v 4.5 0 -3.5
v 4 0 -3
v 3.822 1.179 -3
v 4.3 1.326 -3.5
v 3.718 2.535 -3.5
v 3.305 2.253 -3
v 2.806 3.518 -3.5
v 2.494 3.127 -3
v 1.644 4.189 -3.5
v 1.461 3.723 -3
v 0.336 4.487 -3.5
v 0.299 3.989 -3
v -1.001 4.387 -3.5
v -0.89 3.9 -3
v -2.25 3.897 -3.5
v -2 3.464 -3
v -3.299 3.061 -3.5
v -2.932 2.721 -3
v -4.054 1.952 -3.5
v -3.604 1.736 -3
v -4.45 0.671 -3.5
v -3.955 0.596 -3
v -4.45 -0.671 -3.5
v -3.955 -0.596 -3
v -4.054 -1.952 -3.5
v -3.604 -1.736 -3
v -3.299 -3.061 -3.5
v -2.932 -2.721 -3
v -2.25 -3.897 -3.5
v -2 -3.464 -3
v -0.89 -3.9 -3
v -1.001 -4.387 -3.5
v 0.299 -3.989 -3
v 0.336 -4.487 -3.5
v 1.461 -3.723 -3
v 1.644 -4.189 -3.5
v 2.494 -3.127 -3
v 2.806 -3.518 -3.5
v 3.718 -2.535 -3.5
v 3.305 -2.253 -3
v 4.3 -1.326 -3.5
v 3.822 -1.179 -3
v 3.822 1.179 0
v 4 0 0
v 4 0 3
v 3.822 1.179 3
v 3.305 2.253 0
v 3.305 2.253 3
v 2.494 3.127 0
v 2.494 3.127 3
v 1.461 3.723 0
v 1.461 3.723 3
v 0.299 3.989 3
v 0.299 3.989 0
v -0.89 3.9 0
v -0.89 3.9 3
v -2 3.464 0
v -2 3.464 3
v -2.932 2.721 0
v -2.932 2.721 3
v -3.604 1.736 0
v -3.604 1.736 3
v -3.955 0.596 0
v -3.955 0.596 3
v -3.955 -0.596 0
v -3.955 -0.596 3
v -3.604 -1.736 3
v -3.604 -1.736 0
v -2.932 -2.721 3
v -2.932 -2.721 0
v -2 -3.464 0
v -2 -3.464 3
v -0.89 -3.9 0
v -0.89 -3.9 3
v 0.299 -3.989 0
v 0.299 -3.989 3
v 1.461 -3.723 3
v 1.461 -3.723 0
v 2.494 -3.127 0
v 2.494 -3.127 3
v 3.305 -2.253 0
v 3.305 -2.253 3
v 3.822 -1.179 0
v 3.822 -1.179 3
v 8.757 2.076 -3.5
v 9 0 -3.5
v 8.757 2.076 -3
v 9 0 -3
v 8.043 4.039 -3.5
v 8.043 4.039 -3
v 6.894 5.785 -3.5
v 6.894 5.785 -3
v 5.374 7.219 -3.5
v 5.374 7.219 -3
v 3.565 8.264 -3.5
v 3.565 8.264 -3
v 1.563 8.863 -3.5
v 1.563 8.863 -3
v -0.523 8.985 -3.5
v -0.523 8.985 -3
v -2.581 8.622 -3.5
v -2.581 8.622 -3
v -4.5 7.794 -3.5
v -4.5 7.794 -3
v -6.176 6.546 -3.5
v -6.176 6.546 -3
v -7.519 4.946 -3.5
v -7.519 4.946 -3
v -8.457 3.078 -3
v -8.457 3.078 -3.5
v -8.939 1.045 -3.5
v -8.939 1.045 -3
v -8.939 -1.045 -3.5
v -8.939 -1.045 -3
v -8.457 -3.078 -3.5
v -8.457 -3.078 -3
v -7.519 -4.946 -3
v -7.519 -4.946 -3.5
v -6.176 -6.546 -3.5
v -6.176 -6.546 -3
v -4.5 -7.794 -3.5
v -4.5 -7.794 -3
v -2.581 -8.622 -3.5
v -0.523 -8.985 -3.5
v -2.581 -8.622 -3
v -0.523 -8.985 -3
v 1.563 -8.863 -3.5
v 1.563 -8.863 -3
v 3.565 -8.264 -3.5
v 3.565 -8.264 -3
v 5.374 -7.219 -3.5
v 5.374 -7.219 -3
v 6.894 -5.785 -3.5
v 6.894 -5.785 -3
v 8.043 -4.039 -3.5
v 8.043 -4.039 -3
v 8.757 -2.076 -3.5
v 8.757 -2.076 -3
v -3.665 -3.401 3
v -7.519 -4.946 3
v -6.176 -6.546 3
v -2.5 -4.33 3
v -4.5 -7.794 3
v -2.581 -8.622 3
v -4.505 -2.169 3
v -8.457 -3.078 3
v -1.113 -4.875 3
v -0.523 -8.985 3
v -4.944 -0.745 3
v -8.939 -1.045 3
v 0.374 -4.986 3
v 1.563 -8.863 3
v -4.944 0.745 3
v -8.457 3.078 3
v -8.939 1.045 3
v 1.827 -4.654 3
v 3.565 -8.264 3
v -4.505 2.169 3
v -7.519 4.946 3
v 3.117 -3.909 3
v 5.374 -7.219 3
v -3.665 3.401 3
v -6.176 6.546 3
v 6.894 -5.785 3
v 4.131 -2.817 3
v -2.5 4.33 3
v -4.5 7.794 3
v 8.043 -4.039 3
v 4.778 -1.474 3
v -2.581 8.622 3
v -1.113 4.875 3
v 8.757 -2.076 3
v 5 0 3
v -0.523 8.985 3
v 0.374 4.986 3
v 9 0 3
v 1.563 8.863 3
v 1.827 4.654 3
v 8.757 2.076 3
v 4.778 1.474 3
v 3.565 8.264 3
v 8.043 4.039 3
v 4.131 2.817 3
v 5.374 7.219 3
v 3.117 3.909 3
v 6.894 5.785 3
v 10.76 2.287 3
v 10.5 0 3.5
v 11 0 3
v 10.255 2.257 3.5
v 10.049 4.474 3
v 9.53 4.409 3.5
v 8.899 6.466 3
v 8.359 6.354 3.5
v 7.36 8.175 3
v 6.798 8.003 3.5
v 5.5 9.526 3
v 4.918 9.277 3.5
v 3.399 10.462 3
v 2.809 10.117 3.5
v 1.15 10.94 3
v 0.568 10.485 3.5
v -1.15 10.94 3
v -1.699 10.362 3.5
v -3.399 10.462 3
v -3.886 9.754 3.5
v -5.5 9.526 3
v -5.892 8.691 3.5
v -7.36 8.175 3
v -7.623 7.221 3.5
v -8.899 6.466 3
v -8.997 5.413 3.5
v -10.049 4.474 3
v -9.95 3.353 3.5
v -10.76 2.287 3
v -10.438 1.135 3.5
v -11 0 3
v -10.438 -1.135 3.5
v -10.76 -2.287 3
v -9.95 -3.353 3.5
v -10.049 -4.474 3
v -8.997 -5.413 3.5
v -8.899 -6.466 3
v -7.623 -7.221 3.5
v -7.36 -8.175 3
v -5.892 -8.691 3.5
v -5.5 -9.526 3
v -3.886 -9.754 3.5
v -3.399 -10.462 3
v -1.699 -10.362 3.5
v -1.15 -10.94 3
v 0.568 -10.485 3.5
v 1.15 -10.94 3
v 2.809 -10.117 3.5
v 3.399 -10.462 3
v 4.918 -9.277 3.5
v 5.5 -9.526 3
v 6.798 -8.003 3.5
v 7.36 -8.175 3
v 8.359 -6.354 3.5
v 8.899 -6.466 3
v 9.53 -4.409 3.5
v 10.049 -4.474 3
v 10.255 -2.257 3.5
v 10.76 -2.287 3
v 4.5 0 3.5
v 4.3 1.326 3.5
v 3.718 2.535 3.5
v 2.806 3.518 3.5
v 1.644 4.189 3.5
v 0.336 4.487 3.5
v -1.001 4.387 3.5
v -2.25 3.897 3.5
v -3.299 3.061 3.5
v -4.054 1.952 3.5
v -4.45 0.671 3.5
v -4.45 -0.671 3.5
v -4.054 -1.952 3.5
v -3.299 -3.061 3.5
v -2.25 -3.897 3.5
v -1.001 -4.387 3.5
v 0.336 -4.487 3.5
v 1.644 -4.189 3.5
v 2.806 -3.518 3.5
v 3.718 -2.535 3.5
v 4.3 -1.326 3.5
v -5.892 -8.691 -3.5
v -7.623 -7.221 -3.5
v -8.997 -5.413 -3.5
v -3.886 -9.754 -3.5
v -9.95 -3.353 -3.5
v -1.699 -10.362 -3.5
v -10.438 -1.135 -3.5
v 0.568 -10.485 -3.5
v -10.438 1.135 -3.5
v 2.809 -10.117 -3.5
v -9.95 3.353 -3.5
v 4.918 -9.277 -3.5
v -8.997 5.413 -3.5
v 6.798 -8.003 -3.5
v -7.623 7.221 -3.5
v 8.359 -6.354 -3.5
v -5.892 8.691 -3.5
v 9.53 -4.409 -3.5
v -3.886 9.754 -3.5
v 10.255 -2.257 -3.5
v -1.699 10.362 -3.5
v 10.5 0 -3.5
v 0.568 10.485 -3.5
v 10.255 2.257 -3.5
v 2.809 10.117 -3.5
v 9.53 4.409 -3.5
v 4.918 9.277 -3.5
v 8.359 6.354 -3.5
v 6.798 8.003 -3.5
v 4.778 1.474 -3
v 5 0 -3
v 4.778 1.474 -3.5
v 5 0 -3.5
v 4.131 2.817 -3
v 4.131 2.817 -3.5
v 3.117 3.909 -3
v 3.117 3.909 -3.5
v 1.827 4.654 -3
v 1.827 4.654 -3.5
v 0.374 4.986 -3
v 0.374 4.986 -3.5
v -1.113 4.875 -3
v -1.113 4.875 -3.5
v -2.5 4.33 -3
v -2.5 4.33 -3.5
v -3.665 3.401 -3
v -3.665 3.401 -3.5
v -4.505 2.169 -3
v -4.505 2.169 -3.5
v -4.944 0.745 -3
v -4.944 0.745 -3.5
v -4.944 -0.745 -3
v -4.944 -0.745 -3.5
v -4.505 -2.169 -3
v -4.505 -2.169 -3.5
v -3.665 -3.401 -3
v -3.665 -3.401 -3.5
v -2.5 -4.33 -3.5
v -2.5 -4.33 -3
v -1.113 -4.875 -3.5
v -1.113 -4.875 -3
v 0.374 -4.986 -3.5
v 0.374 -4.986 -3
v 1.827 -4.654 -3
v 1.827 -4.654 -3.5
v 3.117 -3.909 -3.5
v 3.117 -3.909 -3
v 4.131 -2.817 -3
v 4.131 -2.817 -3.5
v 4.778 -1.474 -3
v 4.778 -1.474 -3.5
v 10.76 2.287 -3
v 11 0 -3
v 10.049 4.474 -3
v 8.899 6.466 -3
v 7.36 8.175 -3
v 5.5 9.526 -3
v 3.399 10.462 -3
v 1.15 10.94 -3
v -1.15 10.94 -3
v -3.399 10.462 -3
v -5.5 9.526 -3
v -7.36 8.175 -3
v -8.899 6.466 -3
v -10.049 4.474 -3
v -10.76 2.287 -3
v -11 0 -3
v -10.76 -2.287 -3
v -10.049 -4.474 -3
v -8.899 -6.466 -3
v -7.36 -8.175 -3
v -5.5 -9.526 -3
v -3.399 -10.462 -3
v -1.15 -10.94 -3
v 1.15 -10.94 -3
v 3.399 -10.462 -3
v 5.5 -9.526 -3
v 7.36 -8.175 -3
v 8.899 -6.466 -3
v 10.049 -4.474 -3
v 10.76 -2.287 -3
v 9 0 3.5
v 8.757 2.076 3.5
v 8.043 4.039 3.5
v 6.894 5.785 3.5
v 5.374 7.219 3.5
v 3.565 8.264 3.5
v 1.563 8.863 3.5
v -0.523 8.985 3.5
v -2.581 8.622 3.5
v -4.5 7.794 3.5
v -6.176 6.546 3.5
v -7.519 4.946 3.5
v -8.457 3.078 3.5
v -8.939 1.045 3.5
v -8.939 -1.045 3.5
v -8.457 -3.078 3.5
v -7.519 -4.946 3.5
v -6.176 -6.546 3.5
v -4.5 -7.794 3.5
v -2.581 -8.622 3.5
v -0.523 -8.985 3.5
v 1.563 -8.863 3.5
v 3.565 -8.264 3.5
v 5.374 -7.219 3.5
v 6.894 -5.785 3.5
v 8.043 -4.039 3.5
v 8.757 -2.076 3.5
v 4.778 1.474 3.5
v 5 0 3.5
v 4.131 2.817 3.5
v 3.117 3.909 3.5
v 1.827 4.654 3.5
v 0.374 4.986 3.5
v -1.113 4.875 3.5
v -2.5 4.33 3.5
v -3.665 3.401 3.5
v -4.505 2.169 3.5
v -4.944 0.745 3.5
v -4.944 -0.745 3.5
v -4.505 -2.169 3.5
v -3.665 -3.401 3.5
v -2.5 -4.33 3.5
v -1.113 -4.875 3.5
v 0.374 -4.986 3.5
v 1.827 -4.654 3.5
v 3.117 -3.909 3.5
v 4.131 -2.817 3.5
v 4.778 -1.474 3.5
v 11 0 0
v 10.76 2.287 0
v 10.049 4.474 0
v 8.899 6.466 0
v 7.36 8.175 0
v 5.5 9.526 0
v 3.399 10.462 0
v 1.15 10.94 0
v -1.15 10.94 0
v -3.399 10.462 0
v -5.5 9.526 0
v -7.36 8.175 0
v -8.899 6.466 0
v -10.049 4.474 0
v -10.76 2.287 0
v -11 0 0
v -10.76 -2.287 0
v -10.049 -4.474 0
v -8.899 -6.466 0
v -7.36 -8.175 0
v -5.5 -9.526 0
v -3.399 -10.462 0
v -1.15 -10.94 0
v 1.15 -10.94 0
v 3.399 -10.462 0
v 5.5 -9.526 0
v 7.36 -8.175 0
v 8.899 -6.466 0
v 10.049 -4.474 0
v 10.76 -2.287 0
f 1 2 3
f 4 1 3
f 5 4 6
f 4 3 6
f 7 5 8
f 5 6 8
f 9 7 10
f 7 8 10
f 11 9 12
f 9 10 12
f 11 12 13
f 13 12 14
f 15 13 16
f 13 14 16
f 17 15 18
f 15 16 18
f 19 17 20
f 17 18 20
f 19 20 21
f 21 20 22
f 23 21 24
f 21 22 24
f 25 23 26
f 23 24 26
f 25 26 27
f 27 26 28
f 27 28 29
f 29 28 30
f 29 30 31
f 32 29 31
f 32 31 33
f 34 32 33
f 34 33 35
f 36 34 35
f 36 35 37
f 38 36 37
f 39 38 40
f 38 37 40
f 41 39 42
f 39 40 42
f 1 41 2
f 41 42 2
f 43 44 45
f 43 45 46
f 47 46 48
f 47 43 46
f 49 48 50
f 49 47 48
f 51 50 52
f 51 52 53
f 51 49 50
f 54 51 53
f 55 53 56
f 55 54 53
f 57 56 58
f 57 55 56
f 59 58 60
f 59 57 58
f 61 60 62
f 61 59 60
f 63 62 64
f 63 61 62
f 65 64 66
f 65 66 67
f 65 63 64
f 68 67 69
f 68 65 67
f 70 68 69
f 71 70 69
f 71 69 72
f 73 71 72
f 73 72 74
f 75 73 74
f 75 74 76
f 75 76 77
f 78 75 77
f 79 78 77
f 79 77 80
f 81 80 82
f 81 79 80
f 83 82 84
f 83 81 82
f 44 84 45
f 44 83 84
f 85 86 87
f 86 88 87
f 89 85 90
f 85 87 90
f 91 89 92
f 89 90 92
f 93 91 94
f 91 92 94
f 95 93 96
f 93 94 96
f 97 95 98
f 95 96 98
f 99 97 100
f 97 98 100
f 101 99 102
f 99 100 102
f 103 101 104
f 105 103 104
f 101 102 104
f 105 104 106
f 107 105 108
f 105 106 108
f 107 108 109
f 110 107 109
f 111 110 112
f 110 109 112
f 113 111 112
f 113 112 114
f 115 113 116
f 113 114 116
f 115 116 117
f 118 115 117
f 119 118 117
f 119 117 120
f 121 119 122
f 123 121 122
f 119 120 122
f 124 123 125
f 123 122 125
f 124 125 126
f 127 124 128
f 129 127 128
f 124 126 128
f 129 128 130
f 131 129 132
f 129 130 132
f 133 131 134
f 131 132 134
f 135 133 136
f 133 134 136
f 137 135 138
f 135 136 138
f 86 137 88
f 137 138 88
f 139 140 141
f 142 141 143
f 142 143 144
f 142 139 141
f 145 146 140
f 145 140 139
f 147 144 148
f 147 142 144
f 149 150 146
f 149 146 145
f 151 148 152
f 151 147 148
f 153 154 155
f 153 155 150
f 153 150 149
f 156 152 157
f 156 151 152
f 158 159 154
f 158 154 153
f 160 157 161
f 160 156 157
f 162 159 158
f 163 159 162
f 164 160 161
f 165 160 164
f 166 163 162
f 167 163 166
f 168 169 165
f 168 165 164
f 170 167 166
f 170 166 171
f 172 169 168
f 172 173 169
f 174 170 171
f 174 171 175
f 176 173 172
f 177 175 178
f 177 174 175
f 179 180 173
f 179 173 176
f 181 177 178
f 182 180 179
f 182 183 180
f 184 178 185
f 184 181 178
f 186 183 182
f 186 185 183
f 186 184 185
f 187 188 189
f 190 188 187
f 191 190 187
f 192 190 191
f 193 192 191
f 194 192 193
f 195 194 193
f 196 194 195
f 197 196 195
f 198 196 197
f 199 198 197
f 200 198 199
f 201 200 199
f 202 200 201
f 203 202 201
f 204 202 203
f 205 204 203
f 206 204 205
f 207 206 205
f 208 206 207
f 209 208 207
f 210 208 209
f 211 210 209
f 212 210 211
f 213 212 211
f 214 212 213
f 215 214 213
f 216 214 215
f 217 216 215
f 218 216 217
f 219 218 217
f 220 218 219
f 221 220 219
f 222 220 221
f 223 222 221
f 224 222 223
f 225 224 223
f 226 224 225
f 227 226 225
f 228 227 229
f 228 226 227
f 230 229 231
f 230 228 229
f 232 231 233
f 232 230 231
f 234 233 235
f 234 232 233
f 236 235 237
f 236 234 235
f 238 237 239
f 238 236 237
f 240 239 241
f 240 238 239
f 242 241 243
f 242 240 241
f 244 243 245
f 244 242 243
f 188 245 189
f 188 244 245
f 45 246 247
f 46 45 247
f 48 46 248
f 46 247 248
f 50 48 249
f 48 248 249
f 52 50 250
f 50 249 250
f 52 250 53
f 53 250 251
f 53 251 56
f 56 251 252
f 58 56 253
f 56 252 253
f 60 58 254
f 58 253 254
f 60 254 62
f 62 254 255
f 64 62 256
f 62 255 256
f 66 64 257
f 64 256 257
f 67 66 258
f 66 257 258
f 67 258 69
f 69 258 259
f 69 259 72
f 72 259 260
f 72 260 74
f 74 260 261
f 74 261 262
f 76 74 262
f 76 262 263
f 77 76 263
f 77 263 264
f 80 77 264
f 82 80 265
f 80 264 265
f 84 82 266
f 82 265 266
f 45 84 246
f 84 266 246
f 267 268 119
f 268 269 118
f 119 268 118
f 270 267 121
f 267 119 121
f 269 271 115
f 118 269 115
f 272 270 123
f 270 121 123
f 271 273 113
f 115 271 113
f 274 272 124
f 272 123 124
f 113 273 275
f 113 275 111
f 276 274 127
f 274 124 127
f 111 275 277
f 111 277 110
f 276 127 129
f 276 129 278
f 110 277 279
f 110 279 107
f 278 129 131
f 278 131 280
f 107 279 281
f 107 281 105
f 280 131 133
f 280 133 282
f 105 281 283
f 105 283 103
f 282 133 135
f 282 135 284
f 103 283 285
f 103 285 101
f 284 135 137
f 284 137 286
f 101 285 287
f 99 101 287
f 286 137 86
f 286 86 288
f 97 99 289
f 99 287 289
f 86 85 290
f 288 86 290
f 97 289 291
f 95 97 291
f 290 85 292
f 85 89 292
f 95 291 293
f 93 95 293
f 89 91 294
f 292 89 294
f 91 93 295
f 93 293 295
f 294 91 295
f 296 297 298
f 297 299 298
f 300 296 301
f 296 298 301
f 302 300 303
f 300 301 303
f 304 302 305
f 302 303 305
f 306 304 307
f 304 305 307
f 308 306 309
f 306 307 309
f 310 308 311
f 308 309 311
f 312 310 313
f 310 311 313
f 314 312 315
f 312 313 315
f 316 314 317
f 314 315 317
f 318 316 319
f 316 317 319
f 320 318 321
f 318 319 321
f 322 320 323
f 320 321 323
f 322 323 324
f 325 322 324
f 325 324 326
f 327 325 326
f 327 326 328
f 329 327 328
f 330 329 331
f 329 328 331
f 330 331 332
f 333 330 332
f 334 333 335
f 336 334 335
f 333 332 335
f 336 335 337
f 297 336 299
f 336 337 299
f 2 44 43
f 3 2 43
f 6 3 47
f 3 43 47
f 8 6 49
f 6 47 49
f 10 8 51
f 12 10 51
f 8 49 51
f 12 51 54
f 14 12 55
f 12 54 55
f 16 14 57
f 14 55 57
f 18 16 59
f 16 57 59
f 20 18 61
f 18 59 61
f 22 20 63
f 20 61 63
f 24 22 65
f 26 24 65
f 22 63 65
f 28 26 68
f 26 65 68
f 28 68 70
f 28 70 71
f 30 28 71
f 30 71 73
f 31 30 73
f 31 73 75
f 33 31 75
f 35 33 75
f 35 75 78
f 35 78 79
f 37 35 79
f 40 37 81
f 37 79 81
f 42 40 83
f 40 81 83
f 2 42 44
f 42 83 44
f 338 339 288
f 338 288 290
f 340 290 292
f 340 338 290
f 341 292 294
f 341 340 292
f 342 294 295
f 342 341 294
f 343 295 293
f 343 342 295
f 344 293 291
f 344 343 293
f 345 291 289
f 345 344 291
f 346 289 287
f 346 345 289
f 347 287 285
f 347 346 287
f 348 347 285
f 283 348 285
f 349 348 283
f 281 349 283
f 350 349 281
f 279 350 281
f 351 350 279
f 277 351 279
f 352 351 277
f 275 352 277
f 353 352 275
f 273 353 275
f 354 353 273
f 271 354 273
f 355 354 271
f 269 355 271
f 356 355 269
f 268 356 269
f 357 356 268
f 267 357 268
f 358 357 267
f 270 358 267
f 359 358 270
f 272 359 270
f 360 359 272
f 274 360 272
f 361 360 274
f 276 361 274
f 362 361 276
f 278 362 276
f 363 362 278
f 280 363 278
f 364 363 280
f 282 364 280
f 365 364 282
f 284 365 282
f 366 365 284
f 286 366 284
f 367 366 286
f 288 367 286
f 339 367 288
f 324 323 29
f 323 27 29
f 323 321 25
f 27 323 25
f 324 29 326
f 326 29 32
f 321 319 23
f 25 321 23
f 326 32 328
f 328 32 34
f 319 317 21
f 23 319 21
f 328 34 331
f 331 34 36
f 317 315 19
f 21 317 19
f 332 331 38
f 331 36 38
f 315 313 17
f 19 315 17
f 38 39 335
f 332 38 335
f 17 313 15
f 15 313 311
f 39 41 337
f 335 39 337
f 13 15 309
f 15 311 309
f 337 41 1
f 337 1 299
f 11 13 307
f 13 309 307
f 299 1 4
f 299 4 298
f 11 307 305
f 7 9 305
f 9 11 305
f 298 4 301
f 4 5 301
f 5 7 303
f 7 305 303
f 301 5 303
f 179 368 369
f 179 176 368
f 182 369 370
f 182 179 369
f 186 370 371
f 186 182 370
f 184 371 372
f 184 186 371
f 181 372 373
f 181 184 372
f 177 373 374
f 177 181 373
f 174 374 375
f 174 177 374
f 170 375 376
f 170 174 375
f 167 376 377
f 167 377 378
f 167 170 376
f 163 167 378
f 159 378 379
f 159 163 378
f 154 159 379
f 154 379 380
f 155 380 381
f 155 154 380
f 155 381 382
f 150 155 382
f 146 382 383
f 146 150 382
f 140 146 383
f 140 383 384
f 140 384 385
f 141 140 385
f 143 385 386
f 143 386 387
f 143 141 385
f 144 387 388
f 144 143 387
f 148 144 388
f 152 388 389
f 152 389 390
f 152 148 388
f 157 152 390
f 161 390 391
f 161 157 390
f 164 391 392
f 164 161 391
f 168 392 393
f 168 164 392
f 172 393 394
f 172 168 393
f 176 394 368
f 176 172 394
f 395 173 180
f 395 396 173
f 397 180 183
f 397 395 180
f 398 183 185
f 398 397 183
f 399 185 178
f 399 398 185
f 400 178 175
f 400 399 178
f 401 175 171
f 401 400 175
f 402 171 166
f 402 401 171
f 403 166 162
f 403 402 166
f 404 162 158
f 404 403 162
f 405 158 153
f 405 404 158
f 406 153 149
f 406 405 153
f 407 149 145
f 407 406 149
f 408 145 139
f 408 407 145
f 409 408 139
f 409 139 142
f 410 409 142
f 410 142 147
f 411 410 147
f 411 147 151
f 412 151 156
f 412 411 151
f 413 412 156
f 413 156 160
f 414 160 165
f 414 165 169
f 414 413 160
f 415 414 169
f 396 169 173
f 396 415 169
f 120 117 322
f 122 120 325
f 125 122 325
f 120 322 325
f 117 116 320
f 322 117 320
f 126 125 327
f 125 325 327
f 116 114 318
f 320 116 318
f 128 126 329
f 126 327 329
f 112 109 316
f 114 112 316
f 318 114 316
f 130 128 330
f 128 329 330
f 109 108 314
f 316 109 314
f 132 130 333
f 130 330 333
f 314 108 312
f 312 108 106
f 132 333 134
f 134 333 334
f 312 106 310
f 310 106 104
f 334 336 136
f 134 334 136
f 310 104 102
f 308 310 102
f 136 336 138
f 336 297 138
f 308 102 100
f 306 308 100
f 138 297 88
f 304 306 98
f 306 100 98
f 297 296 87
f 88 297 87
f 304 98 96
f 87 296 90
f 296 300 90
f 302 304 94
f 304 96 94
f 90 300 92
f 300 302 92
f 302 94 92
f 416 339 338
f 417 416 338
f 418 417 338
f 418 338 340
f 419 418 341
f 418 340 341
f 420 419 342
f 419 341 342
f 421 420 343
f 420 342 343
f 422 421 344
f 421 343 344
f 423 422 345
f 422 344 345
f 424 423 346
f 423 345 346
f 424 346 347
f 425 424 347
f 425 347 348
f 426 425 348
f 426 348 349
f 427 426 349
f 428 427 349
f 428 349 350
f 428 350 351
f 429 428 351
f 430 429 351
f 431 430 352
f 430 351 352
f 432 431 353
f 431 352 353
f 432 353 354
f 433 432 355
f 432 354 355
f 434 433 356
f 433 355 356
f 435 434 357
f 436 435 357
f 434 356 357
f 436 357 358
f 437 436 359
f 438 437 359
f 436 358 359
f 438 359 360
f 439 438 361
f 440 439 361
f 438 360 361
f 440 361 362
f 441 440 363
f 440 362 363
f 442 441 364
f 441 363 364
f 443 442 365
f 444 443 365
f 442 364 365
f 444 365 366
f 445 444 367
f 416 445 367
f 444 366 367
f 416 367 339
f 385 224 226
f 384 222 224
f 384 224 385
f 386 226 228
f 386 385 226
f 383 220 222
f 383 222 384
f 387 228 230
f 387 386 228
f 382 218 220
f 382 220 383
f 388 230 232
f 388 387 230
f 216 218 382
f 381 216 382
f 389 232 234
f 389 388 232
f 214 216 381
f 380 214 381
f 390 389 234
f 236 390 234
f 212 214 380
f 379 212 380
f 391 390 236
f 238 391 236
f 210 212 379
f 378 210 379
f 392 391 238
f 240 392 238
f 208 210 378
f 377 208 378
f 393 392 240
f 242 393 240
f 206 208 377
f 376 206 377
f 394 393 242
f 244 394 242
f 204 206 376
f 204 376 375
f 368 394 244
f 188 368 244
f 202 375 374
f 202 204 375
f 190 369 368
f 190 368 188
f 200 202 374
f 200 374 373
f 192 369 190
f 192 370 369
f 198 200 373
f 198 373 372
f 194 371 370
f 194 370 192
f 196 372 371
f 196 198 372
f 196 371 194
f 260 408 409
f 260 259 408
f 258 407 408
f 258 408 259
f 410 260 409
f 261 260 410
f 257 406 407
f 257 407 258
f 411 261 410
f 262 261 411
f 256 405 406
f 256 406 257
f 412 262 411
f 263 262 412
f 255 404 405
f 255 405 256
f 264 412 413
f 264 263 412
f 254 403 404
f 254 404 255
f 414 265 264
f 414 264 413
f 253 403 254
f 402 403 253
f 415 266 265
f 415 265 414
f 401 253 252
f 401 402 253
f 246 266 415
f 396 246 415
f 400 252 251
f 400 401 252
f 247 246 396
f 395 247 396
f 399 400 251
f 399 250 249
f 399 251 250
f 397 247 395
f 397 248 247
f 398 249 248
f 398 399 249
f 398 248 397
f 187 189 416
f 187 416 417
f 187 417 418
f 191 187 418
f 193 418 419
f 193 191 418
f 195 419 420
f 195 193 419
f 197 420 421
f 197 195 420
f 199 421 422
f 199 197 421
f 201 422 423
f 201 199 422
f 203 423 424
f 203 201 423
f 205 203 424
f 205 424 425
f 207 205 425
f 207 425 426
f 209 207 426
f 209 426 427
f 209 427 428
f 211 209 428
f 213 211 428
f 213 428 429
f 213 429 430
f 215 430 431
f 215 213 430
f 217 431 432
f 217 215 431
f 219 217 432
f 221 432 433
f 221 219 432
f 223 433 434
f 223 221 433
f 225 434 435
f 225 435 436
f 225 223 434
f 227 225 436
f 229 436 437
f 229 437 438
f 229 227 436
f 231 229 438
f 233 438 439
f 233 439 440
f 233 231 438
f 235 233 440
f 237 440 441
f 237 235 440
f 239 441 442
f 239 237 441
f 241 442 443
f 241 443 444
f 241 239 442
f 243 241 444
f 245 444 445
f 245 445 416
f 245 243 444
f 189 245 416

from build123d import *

# Parameters (mm, degrees)
F3_SIZE = 0.5


with BuildPart() as f1:
    # F0 (on Front) → F1 (revolve)
    with BuildSketch(Plane.XZ):
        Polygon((5, 3.5), (4, 3.5), (4, 0), (11, 0), (11, 3.5), (9, 3.5), (9, 3), (5, 3), align=None)
    revolve(axis=Axis((0, 0, 3.124244744), (0, 0, 1)))

    # F2: F1 across plane


with BuildPart() as f1_1:
    add(f1.part)
    add(f1.part.mirror(Plane.XY))

    # F3
    f3_edges = [f1_1.edges().sort_by_distance(p)[0] for p in [
        (-11, 0, 3.5),
        (-11, 0, -3.5),
        (-4, 0, 3.5),
        (-4, 0, -3.5),
    ]]
    chamfer(f3_edges, length=F3_SIZE)


solid = f1_1.part
